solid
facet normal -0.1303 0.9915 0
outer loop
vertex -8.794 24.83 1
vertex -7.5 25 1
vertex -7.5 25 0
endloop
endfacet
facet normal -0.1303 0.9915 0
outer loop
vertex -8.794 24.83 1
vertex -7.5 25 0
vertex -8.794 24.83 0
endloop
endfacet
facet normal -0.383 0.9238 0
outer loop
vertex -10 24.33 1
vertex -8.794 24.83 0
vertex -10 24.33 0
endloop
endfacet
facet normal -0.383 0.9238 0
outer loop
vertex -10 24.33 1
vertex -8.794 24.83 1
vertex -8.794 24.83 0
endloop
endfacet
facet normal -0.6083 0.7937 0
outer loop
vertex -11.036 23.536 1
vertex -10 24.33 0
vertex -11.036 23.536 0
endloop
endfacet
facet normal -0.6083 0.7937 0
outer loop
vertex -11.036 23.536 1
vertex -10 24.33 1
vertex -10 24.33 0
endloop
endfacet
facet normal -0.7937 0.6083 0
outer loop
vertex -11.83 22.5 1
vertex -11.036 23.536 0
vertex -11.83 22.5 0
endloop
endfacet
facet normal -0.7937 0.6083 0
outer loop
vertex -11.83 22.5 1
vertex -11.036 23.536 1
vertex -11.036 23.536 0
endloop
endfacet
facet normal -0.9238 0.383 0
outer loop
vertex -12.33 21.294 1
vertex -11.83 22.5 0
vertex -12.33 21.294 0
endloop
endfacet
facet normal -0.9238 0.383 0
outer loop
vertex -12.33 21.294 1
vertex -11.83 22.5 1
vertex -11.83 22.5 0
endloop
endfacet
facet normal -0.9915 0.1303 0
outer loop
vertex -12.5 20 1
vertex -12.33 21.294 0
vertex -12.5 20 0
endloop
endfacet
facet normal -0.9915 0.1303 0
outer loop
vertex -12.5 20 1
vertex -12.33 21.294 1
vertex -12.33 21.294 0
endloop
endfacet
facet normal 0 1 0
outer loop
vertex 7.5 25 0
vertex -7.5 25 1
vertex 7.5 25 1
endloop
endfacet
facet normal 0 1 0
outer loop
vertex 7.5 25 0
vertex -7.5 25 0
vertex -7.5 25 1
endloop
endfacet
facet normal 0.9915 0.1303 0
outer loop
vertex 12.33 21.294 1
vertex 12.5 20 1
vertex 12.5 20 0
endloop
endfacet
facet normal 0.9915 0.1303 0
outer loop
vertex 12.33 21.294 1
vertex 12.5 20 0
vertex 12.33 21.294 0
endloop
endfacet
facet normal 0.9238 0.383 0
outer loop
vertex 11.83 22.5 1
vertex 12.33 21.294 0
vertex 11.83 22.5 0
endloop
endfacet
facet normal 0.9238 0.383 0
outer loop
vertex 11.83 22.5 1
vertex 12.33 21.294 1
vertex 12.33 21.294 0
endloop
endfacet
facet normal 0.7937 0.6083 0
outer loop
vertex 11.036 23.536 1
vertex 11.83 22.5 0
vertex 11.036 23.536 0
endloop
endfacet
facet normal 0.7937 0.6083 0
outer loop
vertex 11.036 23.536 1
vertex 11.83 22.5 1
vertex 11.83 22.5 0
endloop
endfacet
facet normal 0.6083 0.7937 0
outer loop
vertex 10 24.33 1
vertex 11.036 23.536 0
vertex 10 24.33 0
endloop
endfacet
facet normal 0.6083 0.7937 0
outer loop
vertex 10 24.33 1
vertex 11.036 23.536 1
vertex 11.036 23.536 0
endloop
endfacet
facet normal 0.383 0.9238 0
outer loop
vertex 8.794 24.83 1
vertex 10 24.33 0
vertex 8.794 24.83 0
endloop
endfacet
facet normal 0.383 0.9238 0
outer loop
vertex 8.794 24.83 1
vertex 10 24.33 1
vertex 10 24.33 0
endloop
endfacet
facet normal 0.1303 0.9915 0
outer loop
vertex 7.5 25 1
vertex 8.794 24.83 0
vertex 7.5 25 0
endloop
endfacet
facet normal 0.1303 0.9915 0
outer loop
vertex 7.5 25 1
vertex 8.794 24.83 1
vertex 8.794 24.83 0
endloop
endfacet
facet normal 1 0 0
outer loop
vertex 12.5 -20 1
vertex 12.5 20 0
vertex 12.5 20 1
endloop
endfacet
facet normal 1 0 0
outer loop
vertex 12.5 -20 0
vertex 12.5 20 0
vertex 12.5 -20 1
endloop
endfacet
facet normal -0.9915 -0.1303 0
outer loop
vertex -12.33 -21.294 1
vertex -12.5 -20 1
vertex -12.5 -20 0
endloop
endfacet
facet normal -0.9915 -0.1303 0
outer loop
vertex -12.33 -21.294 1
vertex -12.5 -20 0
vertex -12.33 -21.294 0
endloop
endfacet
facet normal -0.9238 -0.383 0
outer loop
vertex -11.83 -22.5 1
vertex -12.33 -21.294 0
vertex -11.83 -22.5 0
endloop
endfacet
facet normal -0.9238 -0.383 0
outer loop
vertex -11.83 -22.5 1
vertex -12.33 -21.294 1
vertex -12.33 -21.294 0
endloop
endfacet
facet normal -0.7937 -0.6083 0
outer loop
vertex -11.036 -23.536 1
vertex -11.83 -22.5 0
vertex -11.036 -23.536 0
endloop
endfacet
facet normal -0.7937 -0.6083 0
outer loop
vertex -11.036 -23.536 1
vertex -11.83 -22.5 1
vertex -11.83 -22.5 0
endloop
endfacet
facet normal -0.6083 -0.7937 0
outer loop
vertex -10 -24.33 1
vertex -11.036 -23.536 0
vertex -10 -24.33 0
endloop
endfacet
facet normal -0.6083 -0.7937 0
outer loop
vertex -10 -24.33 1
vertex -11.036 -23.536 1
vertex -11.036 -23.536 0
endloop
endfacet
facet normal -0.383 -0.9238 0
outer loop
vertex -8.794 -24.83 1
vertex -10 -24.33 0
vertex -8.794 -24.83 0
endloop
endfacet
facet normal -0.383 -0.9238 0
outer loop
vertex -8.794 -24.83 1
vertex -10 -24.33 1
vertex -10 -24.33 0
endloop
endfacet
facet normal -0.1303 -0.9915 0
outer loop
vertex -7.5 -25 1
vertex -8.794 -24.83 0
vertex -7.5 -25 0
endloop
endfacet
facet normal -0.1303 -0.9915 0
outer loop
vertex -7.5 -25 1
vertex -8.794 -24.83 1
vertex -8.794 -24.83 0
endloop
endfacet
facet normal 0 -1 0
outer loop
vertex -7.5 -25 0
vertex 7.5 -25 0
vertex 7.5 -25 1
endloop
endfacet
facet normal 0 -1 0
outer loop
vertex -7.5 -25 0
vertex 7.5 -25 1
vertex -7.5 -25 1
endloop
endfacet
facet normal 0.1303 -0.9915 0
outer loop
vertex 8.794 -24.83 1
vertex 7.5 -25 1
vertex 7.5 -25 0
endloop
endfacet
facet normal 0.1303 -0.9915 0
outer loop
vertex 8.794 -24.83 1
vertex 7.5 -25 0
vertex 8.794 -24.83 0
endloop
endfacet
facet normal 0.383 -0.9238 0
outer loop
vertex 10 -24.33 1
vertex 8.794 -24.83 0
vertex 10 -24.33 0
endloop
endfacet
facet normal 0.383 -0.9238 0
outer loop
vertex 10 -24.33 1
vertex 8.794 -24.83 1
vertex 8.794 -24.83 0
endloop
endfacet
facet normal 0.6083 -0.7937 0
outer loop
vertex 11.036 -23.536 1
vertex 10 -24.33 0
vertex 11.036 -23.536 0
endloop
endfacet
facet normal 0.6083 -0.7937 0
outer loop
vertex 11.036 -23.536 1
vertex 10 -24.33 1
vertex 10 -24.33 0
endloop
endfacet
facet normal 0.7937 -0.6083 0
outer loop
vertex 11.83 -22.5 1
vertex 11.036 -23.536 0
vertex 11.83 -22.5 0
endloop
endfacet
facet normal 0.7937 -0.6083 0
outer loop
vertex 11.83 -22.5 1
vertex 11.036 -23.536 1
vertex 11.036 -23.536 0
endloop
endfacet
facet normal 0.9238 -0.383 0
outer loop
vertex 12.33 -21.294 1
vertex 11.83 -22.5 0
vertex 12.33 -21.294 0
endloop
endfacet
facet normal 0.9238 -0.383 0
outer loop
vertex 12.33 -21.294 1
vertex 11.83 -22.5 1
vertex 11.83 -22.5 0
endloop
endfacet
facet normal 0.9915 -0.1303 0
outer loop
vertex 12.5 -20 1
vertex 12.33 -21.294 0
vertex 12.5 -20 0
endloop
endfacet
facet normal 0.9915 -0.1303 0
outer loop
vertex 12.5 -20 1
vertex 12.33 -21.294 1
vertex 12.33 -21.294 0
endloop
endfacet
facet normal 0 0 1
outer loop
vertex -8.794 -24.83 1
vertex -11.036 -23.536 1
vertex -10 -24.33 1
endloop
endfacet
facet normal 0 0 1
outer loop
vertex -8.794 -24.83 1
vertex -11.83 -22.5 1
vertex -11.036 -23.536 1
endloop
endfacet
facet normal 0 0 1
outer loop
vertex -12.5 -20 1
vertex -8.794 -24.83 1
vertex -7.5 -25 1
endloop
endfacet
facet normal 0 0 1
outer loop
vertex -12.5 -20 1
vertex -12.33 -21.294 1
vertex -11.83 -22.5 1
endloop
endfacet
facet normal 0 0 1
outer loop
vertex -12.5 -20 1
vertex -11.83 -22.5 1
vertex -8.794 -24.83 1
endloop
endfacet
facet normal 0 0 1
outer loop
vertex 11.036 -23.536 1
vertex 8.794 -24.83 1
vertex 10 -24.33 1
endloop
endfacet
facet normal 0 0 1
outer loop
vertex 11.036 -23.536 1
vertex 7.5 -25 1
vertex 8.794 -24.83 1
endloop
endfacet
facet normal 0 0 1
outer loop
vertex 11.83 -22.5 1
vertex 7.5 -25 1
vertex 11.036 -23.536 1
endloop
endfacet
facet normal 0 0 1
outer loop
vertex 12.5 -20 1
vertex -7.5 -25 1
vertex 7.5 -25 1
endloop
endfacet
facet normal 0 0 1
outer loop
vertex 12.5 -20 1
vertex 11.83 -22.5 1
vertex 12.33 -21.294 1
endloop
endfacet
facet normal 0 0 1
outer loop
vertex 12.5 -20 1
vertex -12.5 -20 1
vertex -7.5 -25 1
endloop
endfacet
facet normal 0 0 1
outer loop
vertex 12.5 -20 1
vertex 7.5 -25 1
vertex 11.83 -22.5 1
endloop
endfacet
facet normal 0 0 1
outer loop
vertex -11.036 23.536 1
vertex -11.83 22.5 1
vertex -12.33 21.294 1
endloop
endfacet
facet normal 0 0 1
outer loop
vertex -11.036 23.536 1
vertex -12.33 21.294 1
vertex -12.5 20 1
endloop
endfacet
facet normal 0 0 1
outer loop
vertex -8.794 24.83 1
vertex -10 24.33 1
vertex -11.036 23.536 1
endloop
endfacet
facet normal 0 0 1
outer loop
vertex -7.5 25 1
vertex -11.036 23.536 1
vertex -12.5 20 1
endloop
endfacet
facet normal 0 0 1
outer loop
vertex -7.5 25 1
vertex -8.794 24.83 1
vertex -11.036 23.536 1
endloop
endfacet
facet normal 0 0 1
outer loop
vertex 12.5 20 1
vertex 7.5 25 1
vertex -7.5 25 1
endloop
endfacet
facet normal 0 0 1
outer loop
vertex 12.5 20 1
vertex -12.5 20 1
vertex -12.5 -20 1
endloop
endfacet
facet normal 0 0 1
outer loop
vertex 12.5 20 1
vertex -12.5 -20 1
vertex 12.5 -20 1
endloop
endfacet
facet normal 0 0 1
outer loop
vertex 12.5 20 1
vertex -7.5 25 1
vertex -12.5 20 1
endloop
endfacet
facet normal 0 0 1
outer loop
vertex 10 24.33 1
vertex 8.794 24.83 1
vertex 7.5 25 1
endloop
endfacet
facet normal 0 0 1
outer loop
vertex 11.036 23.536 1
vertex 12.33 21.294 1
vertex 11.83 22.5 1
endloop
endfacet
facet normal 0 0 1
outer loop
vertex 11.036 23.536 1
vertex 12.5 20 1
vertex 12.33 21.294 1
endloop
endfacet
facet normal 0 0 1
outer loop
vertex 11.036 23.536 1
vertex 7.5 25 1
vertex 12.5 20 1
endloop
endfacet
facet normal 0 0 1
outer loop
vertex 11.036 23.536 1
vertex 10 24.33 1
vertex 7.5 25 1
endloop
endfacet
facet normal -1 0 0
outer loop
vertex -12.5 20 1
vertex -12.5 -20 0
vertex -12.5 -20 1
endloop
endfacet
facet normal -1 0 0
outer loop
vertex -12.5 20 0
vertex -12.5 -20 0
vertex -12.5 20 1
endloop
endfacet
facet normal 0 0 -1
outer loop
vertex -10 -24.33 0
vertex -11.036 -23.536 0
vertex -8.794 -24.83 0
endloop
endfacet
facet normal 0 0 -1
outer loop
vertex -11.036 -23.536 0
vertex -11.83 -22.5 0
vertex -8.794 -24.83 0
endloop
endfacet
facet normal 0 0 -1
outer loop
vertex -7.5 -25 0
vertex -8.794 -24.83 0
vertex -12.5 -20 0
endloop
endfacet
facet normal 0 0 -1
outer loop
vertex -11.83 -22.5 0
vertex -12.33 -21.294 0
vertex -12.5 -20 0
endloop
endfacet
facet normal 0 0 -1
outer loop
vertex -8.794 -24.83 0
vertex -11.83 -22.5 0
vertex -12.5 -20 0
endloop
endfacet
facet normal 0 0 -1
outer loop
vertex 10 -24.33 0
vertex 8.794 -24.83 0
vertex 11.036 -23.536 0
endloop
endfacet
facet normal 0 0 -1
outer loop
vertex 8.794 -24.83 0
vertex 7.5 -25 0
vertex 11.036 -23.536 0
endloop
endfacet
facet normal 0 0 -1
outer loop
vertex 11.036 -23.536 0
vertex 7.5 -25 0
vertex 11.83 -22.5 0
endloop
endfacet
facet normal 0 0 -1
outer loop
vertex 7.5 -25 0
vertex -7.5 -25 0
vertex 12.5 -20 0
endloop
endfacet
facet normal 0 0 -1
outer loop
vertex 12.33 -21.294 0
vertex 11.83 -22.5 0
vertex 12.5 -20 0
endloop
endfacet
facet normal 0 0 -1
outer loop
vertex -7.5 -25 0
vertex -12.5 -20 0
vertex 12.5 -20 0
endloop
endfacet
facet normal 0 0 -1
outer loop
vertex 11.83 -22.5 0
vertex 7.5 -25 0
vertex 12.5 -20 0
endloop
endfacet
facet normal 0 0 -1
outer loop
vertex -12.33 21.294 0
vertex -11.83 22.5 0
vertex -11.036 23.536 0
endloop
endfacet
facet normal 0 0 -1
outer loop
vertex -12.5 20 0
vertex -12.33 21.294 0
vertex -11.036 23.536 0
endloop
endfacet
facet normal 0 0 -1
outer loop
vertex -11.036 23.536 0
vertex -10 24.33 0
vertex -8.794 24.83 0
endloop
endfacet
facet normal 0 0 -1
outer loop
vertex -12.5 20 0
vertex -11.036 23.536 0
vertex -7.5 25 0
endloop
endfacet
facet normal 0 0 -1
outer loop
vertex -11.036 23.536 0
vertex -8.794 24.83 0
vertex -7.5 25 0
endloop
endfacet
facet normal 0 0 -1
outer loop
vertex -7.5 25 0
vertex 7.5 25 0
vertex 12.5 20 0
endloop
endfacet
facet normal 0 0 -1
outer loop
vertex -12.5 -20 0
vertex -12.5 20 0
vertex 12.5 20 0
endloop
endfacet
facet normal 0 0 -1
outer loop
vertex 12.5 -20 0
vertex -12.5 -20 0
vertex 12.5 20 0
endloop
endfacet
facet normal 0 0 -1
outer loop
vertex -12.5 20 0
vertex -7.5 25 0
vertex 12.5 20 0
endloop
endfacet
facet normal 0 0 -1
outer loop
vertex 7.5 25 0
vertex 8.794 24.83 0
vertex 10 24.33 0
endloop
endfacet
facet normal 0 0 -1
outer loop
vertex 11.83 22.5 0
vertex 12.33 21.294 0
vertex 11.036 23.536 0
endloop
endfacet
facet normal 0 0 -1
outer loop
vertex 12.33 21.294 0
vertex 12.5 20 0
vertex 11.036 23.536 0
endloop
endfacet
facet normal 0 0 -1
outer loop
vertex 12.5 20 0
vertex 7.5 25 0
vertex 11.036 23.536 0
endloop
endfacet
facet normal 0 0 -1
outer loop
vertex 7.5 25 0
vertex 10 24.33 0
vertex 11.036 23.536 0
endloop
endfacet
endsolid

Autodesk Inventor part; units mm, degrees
ref_plane "YZ Plane" through (0, 0, 0) normal (1, 0, 0) x (0, 1, 0)
ref_plane "XZ Plane" through (0, 0, 0) normal (0, 1, 0) x (-1, 0, 0)
ref_plane "XY Plane" through (0, 0, 0) normal (0, 0, 1) x (1, 0, 0)
sketch "Sketch1" plane through (0, 0, 0) normal (0, 0, 1) x (1, 0, 0)
  line L0 (0, 20.1746) -> (0, -21.4461) construction
  line L1 (-20.2028, 0) -> (20.1685, 0) construction
  line L2 (-12.5, 25) -> (12.5, 25)
  line L3 (12.5, 25) -> (12.5, -25)
  line L4 (12.5, -25) -> (-12.5, -25)
  line L5 (-12.5, -25) -> (-12.5, 25)
  point P0 (0, 0)
  dimension "d0" = 50
  dimension "d1" = 25
  dimension "d2" = 25
  dimension "d3" = 12.5
extrude "Extrusion1" add sketch "Sketch1" along normal blind 1
fillet "Fillet1" radius 5 4 edges at (12.5, 25, 0.5) (-12.5, 25, 0.5) (12.5, -25, 0.5) (-12.5, -25, 0.5)
chamfer "Chamfer1" [suppressed]
equation "\"d0\" = height"
equation "\"d1\" = 0.5 * height"
equation "\"d2\" = width"
equation "\"d3\" = 0.5 * width"
equation "\"d4\" = thickness"
equation "\"d6\" = fillet"
equation "\"fillet\" = 5"
equation "\"chamfer\" = 0"
equation "\"thickness\" = 1"
equation "\"width\" = 25"
equation "\"height\" = 50"
properties part number "Placa Esquinas empalmadas (mm) 25 x 50 x 1" material "Acero, suave"
